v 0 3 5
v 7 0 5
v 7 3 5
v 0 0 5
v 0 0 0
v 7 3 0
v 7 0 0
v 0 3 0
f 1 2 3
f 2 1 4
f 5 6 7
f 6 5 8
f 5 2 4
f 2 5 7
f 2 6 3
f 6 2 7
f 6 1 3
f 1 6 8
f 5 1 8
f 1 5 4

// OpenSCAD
// Generated by SolidPython 1.0.1 on 2020-07-29 00:46:54


cube(size = [7, 3, 5]);
/***********************************************
*********      SolidPython code:      **********
************************************************
 
# import packages: SolidPython
from solid import *
from solid.utils import *
from itertools import chain, combinations, permutations


class Resize:

    def __init__(self, scad_file):
        self.scad_file = scad_file
        #self.scad_file = import_scad(scad_file)
        # cone/cylinder param:
        self.r1 = 0
        self.r2 = 0
        self.h = 0
        # rectangular prism param:
        self.w = 0
        self.l = 0
        # ellipse param:
        self.r = 0

    # import OpenScad code (file name corresponds to shape)


    # classify shape + parameters
    def assign(self, param1, param2, param3):
        if self.scad_file == 'cone.scad':
            self.r1 = param1
            self.r2 = param2
            self.h = param3
        elif self.scad_file == 'cylinder.scad':
            self.r1 = param1
            self.r2 = param2
            self.h = param3
        elif self.scad_file == 'rectangularPrism.scad':
            self.h = param1
            self.l = param2
            self.w = param3
        else:
            self.r = param1
            self.h = param2

    # resize parameters
    def iterate(self):
        x = range(3, 20, 2)
        i = 1
        if self.scad_file == 'cone.scad':
            tempList = list(permutations(x, 2))
            for temp in tempList:
                param1 = temp[0]
                param2 = temp[1]
                filepath = 'produced_scad_files/' + 'cone' + str(param1) + '_' + str(param2) + '_' + '.scad'
                scad_render_to_file(cylinder(h=param1, r1=param2, r2=0), filepath)

        elif self.scad_file == 'cylinder.scad':
            tempList = list(permutations(x, 3))
            for temp in tempList:
                param1 = temp[0]
                param2 = temp[1]
                filepath = 'produced_scad_files/' + 'cylinder' + str(param1) + '_' + str(param2) + '_' + '.scad'
                scad_render_to_file(cylinder(h=param1, r1=param2, r2=param2), filepath)

        elif self.scad_file == 'rectangularPrism.scad':
            tempList = list(permutations(x, 3))
            for temp in tempList:
                param1 = temp[0]
                param2 = temp[1]
                param3 = temp[2]
                filepath = 'produced_scad_files/' + 'rectangularPrism' + str(param1) + '_' + str(param2) + '_' + str(
                    param3) + '.scad'
                scad_render_to_file(cube(size=(param1, param2, param3)), filepath)

        elif self.scad_file == 'ellipse.scad':
            tempList = list(permutations(x, 4))
            for temp in tempList:
                param1 = temp[0]
                param2 = temp[1]
                param3 = temp[2]
                param4 = temp[3]
                filepath = 'produced_scad_files/' + 'ellipse' + str(param1) + '_' + str(param2) + '_' + str(param3) + '_' + str(param4) + '.scad'
                scad_render_to_file(scale([param1, param2, param3])(sphere(r=param4)), filepath)

    def render_to_scadfile(self):
        scad_render_to_file(scad, 'example.scad') 
 
************************************************/
